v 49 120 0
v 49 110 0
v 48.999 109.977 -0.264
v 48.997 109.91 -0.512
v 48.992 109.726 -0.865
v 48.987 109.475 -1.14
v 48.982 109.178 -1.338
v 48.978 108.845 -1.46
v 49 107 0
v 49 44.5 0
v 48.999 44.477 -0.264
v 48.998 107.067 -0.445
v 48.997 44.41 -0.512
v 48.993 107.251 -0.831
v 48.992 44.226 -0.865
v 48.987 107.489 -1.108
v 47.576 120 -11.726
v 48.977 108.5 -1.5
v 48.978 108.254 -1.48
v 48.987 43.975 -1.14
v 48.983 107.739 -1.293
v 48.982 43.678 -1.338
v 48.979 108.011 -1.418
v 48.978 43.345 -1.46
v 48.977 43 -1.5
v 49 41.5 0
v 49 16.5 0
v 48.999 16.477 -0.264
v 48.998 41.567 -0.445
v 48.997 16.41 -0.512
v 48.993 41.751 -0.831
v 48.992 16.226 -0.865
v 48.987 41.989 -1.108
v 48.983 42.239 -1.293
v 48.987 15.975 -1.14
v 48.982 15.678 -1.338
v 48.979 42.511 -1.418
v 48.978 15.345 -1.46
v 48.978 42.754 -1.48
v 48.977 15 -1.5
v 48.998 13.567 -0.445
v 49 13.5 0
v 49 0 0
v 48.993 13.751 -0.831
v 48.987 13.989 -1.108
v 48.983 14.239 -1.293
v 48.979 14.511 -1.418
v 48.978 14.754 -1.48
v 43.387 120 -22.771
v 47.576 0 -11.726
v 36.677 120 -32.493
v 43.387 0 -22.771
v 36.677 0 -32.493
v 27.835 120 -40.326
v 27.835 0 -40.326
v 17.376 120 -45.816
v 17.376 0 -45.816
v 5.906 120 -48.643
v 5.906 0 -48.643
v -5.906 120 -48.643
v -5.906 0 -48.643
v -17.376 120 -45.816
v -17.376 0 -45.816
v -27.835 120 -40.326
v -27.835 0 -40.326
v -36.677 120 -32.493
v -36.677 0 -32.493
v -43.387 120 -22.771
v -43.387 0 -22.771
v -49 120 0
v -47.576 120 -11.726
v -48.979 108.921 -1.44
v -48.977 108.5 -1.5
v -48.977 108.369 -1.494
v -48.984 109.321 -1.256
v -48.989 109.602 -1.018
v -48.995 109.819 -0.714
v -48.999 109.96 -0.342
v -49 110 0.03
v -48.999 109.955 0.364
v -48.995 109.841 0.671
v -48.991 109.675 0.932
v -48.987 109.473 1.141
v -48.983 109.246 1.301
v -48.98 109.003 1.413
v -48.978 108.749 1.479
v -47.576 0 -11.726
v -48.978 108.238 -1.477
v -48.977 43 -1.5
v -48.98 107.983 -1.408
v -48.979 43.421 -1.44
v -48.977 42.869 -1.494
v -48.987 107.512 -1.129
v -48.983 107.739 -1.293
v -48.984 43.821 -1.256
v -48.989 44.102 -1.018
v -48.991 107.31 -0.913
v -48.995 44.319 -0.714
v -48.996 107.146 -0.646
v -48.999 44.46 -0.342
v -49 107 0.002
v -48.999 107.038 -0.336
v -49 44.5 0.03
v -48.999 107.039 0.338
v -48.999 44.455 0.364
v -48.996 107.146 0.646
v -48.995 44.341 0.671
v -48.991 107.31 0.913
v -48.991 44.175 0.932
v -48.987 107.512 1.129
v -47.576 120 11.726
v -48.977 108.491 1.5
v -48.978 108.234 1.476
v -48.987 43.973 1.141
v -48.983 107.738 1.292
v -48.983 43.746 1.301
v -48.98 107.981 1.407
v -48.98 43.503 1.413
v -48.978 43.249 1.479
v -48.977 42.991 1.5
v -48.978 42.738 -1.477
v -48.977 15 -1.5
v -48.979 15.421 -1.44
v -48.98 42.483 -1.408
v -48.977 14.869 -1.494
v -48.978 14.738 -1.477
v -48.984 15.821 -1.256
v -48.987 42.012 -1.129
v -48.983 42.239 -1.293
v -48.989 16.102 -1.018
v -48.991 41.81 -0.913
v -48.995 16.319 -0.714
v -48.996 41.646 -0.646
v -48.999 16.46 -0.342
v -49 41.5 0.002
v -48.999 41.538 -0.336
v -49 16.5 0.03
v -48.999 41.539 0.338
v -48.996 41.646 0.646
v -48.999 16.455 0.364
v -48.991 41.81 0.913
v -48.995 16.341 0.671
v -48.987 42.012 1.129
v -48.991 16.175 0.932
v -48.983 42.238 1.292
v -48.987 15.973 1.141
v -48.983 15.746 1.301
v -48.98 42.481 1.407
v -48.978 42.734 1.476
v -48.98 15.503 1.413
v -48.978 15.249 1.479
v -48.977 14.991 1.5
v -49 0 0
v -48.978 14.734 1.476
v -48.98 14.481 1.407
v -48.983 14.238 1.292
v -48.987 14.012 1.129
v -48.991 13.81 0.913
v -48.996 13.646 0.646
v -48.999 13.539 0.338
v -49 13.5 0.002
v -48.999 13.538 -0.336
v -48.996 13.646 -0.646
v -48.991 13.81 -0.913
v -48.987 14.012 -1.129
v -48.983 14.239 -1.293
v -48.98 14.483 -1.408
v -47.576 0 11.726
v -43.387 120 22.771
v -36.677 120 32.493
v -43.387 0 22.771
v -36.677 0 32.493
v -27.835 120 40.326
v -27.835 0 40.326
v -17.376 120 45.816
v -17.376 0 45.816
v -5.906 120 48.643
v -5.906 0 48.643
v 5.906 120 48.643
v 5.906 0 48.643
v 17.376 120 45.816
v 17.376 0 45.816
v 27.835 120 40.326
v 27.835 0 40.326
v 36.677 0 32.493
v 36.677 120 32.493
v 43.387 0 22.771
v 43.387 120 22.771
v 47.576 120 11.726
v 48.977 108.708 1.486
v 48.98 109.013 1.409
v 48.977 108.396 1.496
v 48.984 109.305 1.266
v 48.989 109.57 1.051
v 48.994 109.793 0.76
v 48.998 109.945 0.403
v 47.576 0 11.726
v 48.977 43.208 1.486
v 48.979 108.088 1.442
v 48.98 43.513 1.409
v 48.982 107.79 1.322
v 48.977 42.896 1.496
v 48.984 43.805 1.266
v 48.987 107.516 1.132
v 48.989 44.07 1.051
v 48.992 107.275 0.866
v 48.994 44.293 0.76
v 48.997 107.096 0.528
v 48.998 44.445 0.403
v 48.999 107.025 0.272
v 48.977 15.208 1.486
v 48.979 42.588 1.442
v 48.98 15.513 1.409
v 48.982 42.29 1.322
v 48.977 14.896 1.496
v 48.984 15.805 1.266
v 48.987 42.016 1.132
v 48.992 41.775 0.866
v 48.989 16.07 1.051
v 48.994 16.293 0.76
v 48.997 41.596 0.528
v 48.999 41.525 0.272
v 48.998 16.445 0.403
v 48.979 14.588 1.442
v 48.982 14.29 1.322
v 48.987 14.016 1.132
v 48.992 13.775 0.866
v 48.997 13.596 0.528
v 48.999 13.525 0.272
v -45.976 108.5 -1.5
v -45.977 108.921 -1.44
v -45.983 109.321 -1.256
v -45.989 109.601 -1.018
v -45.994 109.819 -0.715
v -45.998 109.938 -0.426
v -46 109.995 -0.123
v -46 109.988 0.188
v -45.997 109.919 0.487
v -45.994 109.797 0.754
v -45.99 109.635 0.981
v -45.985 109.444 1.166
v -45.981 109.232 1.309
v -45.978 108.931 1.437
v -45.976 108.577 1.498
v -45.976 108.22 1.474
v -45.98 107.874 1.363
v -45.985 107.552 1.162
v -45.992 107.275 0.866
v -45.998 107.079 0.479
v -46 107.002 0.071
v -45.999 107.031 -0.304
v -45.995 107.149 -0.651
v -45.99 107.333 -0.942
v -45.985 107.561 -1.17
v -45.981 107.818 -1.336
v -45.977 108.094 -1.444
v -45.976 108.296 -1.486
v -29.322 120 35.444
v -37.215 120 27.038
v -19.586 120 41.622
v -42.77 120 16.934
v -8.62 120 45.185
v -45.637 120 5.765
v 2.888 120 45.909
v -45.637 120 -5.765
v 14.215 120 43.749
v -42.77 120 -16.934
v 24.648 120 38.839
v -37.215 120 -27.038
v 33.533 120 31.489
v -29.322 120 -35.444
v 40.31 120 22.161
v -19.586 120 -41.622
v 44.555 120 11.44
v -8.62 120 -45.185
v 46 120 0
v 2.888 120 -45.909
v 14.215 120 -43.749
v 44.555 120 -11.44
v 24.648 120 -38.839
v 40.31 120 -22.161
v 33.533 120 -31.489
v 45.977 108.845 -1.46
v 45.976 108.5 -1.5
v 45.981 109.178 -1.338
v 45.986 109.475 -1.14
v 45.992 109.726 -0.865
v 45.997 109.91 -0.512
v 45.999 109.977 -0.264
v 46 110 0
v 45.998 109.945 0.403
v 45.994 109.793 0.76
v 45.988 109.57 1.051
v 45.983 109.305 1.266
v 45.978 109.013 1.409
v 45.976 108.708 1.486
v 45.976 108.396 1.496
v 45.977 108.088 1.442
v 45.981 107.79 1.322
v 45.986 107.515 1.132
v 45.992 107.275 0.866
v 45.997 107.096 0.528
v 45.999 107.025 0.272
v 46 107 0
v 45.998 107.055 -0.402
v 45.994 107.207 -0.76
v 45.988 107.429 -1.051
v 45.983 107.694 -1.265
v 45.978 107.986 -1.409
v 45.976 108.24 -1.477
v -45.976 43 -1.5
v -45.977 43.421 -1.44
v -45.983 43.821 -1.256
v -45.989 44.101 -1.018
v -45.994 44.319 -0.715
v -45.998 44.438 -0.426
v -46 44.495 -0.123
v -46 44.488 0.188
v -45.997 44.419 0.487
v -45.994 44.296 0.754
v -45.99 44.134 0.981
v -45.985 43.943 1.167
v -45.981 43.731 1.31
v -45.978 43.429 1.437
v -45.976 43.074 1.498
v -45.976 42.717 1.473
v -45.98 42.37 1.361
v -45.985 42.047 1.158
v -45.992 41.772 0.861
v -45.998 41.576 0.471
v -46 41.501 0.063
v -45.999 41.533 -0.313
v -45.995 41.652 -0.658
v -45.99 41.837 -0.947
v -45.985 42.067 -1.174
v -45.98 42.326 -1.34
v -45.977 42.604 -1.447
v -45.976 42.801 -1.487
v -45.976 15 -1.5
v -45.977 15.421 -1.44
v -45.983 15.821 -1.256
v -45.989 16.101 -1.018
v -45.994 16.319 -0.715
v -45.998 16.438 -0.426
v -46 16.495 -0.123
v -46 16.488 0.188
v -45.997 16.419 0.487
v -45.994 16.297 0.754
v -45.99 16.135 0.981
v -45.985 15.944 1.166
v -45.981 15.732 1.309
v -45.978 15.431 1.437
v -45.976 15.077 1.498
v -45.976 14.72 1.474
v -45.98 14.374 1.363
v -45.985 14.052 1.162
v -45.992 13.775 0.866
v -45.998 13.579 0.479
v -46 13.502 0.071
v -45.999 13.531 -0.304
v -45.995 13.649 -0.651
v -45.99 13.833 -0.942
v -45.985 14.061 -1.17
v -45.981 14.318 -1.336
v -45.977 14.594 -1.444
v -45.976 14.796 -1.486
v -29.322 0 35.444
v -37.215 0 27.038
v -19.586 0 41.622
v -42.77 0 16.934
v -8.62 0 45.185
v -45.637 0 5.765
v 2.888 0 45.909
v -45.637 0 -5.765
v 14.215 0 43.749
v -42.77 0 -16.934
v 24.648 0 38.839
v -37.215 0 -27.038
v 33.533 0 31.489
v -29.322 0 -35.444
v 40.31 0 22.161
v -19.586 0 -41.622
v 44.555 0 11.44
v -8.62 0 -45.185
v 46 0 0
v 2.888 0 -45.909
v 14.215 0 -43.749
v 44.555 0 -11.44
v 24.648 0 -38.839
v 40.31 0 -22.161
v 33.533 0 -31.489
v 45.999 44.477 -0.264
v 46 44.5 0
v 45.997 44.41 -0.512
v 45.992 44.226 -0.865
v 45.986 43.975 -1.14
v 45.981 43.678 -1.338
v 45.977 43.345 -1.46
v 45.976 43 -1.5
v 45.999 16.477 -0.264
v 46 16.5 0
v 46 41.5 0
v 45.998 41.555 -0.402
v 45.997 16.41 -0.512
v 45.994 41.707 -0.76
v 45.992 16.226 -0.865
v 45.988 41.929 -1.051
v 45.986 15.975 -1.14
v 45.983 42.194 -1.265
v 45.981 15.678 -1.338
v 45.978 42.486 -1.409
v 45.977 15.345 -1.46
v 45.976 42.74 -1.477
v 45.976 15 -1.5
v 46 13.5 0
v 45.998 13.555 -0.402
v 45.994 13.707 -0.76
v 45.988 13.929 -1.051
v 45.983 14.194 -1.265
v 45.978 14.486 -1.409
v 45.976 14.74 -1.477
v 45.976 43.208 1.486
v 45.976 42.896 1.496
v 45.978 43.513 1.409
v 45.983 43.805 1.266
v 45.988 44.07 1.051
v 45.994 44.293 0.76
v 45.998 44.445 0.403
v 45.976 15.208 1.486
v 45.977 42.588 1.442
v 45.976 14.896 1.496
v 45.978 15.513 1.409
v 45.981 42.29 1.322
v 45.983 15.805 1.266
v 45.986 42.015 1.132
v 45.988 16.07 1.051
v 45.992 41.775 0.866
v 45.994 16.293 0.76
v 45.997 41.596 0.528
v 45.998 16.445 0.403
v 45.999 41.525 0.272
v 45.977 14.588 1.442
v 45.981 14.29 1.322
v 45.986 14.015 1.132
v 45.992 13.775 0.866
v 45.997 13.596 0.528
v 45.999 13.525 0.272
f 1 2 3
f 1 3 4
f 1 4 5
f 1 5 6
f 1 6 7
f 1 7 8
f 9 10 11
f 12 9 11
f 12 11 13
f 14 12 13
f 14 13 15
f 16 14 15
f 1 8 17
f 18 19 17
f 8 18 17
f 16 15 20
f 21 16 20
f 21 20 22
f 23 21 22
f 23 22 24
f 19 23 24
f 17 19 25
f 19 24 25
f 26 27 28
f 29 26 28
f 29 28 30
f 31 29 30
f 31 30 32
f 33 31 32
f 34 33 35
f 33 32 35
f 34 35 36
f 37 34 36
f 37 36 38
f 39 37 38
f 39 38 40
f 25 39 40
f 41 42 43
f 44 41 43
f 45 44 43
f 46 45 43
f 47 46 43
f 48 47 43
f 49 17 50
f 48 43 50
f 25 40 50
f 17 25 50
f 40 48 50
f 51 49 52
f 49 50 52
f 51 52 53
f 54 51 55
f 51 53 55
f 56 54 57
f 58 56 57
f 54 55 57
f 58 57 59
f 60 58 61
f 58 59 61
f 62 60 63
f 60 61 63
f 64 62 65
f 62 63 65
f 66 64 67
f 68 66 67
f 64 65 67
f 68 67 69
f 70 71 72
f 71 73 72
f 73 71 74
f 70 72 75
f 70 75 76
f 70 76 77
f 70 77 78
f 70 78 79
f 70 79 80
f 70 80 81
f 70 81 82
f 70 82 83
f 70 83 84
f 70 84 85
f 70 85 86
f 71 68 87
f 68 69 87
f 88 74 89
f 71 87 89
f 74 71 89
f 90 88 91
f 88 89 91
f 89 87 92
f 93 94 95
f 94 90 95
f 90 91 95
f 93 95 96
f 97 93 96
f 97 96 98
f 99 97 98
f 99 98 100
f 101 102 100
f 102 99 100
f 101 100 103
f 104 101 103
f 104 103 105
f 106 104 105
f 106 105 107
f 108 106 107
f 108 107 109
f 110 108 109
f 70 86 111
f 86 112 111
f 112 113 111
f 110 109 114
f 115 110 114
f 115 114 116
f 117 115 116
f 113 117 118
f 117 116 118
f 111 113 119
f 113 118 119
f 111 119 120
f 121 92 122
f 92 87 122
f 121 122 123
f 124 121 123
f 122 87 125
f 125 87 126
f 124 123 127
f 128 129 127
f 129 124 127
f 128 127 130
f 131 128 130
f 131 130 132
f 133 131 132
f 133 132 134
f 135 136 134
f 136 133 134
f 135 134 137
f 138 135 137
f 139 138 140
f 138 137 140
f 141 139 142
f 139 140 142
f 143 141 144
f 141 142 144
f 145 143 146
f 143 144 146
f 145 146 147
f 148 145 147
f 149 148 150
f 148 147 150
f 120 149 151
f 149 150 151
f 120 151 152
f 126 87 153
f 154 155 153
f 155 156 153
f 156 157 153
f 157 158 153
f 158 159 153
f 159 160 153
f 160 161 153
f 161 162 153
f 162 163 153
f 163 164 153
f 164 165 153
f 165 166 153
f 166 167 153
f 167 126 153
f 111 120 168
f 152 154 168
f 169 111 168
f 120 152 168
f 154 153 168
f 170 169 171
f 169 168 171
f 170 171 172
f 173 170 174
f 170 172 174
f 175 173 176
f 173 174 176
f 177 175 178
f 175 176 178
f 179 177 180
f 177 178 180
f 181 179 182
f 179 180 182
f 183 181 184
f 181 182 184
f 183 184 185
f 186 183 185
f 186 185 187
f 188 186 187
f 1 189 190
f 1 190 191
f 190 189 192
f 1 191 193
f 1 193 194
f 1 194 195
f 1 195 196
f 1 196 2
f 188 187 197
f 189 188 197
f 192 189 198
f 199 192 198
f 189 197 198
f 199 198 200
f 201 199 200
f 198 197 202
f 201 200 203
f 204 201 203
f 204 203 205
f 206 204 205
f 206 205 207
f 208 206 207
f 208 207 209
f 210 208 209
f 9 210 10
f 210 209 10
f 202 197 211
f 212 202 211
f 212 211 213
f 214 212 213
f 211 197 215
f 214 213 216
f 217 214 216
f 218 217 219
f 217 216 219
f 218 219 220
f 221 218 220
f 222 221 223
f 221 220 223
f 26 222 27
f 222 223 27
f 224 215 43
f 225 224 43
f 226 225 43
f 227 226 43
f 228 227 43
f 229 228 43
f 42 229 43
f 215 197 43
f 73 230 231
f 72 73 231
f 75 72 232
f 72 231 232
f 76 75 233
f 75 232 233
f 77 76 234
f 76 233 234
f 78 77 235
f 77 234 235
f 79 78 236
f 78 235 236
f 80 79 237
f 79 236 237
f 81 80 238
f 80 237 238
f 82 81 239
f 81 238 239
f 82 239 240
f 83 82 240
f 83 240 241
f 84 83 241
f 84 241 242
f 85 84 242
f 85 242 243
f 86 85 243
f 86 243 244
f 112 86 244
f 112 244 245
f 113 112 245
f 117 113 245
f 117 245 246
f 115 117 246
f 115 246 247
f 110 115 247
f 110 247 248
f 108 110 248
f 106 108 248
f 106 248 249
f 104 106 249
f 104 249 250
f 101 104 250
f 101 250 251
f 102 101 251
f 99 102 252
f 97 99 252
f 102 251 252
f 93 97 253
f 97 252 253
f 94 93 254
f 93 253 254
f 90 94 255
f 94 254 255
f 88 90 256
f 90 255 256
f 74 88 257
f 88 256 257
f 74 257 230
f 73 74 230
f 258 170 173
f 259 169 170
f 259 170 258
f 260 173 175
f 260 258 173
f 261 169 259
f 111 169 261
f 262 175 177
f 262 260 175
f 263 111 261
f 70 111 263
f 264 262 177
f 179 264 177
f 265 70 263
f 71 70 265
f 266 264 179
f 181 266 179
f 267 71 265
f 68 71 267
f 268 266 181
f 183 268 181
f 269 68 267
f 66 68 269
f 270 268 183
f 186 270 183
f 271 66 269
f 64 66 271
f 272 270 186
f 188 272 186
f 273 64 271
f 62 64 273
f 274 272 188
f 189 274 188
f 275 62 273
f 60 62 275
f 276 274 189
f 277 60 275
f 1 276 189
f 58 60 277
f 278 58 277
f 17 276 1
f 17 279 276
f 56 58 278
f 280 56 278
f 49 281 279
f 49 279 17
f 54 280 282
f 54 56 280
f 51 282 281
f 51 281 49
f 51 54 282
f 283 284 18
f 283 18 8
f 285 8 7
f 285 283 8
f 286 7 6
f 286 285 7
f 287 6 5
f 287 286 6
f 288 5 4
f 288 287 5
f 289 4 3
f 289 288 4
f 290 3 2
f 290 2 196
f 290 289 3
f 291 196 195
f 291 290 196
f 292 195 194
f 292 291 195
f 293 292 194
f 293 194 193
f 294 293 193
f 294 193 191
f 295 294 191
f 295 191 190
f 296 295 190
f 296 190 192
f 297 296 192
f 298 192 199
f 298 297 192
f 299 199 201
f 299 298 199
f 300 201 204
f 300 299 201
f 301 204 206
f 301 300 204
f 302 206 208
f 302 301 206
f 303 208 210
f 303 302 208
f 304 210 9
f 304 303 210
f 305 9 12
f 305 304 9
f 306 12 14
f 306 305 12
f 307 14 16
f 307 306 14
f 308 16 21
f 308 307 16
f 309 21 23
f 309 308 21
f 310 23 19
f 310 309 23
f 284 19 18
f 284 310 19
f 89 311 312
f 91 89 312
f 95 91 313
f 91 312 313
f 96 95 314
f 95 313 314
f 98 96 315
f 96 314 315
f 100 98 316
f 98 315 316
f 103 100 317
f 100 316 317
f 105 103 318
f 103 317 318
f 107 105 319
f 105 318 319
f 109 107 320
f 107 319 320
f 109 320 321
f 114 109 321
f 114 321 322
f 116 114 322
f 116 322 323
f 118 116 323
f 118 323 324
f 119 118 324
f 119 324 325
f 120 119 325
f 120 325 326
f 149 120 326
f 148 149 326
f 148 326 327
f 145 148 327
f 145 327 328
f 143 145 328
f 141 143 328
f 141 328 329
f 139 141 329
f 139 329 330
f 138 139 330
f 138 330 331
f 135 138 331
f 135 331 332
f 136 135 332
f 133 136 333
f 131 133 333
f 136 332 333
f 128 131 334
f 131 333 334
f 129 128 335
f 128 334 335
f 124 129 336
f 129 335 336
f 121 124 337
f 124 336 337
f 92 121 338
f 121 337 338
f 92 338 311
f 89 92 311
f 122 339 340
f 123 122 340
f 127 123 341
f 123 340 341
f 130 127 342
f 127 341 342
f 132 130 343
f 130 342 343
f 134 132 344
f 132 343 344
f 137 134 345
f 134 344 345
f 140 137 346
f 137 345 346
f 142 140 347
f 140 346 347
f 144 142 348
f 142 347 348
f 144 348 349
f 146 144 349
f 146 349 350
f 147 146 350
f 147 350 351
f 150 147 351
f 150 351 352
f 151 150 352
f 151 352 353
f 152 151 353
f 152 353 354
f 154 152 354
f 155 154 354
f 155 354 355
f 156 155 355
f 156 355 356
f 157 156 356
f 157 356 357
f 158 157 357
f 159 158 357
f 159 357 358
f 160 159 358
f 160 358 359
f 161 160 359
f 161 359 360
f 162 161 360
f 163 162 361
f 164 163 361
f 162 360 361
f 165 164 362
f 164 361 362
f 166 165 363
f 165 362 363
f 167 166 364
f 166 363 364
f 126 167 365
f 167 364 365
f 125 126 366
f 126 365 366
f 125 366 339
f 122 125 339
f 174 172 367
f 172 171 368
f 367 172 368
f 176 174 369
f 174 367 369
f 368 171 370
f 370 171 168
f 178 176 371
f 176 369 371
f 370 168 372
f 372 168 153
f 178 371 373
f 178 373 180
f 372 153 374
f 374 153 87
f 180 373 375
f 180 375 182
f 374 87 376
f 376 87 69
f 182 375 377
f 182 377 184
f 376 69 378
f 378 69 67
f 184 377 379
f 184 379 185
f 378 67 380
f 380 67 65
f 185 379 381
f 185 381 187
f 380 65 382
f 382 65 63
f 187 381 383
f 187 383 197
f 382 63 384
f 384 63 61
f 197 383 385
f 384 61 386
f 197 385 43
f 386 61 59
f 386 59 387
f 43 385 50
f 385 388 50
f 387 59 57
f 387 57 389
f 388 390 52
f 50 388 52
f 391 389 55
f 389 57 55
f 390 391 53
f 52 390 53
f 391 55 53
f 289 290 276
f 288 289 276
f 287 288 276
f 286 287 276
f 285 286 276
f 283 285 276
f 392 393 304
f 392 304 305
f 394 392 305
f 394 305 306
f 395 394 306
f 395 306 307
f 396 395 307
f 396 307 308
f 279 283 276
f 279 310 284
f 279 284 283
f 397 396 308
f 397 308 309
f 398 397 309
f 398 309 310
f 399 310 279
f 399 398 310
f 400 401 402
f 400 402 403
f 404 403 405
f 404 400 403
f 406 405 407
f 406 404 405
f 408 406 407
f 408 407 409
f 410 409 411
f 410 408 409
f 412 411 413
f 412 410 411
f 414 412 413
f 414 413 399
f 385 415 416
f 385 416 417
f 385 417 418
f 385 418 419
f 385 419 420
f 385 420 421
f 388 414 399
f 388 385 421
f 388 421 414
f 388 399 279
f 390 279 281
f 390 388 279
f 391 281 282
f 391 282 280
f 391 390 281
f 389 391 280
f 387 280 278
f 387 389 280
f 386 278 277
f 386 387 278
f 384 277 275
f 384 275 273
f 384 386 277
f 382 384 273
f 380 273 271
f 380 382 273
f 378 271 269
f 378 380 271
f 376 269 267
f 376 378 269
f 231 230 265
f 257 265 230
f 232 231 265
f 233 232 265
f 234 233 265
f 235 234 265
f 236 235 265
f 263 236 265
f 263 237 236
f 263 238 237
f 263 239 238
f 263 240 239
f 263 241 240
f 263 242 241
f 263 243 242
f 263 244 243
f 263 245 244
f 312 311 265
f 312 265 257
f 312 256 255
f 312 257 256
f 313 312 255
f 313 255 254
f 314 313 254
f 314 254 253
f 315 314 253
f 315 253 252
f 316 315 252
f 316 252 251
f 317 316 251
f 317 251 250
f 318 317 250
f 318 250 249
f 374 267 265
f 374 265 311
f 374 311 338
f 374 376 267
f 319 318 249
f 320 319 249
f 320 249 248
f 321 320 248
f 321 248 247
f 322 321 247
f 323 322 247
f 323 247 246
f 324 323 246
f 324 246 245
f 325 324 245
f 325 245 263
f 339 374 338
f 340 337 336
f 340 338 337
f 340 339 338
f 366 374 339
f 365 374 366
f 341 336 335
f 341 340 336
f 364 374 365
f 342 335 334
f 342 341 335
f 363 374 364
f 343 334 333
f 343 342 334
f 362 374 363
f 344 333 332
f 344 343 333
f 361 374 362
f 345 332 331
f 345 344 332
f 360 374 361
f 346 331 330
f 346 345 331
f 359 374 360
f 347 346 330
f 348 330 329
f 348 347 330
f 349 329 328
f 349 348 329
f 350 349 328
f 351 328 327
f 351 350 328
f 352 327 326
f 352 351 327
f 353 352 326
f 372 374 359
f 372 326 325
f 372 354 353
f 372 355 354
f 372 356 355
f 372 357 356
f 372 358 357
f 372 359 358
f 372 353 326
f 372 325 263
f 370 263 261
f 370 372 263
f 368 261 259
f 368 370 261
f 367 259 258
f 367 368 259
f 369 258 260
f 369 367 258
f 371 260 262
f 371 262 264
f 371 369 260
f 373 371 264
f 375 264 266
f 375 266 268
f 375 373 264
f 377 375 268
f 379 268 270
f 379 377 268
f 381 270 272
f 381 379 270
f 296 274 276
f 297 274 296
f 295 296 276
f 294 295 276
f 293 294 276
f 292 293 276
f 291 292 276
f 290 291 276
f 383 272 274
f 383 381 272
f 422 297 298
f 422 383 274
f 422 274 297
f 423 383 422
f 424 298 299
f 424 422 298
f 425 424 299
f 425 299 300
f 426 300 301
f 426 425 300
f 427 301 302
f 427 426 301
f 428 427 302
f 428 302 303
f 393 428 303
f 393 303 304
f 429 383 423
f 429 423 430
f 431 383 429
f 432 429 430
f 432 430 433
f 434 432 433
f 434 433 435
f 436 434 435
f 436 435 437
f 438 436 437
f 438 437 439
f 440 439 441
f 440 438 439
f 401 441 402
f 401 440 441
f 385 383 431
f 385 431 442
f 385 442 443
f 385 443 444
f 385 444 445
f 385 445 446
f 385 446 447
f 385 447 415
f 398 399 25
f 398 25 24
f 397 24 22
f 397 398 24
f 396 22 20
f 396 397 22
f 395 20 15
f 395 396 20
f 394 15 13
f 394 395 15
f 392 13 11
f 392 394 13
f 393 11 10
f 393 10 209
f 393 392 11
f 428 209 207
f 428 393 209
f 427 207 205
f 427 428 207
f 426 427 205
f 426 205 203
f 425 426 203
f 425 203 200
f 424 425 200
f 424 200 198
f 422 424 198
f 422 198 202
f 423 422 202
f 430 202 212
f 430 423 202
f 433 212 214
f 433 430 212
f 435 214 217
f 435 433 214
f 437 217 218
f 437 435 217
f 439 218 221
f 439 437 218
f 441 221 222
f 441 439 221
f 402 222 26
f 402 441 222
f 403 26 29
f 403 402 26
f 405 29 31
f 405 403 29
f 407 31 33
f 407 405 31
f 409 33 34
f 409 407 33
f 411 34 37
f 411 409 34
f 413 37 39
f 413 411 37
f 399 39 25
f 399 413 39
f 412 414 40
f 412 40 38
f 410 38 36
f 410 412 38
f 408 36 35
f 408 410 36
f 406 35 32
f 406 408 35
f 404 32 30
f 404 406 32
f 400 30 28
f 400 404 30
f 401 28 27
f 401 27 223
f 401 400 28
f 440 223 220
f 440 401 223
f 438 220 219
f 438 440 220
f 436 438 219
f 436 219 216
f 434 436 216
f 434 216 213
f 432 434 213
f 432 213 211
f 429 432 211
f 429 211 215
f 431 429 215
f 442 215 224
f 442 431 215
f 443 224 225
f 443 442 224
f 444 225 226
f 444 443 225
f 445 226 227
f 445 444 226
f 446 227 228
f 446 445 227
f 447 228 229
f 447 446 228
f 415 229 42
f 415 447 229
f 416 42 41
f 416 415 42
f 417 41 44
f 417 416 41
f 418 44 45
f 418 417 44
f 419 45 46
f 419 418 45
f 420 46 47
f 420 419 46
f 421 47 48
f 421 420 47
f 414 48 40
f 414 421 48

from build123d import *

# Parameters (mm, degrees)
SKETCH2_R               = 49
SKETCH2_R_2             = 46
BOSS_EXTRUDE1_DEPTH     = 120
SKETCH5_R               = 1.5
CUT_EXTRUDE2_DEPTH      = 50
CUT_EXTRUDE2_DEPTH_BACK = 50
SKETCH6_R               = 1.5
CUT_EXTRUDE3_DEPTH      = 50.0000001
CUT_EXTRUDE3_DEPTH_BACK = 50.000000102


with BuildPart() as part:
    # Sketch2 → Boss-Extrude1 (new body)
    with BuildSketch(Plane(origin=(0, 0, 0), x_dir=(1, 0, 0), z_dir=(0, 1, 0))):
        Circle(SKETCH2_R)
        Circle(SKETCH2_R_2, mode=Mode.SUBTRACT)
    extrude(amount=BOSS_EXTRUDE1_DEPTH)

    # Sketch5 → Cut-Extrude2 (cut, two sides)
    with BuildSketch(Plane(origin=(0, 0, 0), x_dir=(0, 0, -1), z_dir=(1, 0, 0))) as cut_extrude2_sk:
        with Locations((0, 108.5)):
            Circle(SKETCH5_R)
    extrude(amount=CUT_EXTRUDE2_DEPTH, mode=Mode.SUBTRACT)
    extrude(cut_extrude2_sk.sketch, amount=-CUT_EXTRUDE2_DEPTH_BACK, mode=Mode.SUBTRACT)

    # Sketch6 → Cut-Extrude3 (cut, two sides)
    with BuildSketch(Plane(origin=(0, 0, 0), x_dir=(0, 0, -1), z_dir=(1, 0, 0))) as cut_extrude3_sk:
        with Locations((0, 15)):
            Circle(SKETCH6_R)
        with Locations((0, 43)):
            Circle(SKETCH6_R)
    extrude(amount=CUT_EXTRUDE3_DEPTH, mode=Mode.SUBTRACT)
    extrude(cut_extrude3_sk.sketch, amount=-CUT_EXTRUDE3_DEPTH_BACK, mode=Mode.SUBTRACT)


solid = part.part
